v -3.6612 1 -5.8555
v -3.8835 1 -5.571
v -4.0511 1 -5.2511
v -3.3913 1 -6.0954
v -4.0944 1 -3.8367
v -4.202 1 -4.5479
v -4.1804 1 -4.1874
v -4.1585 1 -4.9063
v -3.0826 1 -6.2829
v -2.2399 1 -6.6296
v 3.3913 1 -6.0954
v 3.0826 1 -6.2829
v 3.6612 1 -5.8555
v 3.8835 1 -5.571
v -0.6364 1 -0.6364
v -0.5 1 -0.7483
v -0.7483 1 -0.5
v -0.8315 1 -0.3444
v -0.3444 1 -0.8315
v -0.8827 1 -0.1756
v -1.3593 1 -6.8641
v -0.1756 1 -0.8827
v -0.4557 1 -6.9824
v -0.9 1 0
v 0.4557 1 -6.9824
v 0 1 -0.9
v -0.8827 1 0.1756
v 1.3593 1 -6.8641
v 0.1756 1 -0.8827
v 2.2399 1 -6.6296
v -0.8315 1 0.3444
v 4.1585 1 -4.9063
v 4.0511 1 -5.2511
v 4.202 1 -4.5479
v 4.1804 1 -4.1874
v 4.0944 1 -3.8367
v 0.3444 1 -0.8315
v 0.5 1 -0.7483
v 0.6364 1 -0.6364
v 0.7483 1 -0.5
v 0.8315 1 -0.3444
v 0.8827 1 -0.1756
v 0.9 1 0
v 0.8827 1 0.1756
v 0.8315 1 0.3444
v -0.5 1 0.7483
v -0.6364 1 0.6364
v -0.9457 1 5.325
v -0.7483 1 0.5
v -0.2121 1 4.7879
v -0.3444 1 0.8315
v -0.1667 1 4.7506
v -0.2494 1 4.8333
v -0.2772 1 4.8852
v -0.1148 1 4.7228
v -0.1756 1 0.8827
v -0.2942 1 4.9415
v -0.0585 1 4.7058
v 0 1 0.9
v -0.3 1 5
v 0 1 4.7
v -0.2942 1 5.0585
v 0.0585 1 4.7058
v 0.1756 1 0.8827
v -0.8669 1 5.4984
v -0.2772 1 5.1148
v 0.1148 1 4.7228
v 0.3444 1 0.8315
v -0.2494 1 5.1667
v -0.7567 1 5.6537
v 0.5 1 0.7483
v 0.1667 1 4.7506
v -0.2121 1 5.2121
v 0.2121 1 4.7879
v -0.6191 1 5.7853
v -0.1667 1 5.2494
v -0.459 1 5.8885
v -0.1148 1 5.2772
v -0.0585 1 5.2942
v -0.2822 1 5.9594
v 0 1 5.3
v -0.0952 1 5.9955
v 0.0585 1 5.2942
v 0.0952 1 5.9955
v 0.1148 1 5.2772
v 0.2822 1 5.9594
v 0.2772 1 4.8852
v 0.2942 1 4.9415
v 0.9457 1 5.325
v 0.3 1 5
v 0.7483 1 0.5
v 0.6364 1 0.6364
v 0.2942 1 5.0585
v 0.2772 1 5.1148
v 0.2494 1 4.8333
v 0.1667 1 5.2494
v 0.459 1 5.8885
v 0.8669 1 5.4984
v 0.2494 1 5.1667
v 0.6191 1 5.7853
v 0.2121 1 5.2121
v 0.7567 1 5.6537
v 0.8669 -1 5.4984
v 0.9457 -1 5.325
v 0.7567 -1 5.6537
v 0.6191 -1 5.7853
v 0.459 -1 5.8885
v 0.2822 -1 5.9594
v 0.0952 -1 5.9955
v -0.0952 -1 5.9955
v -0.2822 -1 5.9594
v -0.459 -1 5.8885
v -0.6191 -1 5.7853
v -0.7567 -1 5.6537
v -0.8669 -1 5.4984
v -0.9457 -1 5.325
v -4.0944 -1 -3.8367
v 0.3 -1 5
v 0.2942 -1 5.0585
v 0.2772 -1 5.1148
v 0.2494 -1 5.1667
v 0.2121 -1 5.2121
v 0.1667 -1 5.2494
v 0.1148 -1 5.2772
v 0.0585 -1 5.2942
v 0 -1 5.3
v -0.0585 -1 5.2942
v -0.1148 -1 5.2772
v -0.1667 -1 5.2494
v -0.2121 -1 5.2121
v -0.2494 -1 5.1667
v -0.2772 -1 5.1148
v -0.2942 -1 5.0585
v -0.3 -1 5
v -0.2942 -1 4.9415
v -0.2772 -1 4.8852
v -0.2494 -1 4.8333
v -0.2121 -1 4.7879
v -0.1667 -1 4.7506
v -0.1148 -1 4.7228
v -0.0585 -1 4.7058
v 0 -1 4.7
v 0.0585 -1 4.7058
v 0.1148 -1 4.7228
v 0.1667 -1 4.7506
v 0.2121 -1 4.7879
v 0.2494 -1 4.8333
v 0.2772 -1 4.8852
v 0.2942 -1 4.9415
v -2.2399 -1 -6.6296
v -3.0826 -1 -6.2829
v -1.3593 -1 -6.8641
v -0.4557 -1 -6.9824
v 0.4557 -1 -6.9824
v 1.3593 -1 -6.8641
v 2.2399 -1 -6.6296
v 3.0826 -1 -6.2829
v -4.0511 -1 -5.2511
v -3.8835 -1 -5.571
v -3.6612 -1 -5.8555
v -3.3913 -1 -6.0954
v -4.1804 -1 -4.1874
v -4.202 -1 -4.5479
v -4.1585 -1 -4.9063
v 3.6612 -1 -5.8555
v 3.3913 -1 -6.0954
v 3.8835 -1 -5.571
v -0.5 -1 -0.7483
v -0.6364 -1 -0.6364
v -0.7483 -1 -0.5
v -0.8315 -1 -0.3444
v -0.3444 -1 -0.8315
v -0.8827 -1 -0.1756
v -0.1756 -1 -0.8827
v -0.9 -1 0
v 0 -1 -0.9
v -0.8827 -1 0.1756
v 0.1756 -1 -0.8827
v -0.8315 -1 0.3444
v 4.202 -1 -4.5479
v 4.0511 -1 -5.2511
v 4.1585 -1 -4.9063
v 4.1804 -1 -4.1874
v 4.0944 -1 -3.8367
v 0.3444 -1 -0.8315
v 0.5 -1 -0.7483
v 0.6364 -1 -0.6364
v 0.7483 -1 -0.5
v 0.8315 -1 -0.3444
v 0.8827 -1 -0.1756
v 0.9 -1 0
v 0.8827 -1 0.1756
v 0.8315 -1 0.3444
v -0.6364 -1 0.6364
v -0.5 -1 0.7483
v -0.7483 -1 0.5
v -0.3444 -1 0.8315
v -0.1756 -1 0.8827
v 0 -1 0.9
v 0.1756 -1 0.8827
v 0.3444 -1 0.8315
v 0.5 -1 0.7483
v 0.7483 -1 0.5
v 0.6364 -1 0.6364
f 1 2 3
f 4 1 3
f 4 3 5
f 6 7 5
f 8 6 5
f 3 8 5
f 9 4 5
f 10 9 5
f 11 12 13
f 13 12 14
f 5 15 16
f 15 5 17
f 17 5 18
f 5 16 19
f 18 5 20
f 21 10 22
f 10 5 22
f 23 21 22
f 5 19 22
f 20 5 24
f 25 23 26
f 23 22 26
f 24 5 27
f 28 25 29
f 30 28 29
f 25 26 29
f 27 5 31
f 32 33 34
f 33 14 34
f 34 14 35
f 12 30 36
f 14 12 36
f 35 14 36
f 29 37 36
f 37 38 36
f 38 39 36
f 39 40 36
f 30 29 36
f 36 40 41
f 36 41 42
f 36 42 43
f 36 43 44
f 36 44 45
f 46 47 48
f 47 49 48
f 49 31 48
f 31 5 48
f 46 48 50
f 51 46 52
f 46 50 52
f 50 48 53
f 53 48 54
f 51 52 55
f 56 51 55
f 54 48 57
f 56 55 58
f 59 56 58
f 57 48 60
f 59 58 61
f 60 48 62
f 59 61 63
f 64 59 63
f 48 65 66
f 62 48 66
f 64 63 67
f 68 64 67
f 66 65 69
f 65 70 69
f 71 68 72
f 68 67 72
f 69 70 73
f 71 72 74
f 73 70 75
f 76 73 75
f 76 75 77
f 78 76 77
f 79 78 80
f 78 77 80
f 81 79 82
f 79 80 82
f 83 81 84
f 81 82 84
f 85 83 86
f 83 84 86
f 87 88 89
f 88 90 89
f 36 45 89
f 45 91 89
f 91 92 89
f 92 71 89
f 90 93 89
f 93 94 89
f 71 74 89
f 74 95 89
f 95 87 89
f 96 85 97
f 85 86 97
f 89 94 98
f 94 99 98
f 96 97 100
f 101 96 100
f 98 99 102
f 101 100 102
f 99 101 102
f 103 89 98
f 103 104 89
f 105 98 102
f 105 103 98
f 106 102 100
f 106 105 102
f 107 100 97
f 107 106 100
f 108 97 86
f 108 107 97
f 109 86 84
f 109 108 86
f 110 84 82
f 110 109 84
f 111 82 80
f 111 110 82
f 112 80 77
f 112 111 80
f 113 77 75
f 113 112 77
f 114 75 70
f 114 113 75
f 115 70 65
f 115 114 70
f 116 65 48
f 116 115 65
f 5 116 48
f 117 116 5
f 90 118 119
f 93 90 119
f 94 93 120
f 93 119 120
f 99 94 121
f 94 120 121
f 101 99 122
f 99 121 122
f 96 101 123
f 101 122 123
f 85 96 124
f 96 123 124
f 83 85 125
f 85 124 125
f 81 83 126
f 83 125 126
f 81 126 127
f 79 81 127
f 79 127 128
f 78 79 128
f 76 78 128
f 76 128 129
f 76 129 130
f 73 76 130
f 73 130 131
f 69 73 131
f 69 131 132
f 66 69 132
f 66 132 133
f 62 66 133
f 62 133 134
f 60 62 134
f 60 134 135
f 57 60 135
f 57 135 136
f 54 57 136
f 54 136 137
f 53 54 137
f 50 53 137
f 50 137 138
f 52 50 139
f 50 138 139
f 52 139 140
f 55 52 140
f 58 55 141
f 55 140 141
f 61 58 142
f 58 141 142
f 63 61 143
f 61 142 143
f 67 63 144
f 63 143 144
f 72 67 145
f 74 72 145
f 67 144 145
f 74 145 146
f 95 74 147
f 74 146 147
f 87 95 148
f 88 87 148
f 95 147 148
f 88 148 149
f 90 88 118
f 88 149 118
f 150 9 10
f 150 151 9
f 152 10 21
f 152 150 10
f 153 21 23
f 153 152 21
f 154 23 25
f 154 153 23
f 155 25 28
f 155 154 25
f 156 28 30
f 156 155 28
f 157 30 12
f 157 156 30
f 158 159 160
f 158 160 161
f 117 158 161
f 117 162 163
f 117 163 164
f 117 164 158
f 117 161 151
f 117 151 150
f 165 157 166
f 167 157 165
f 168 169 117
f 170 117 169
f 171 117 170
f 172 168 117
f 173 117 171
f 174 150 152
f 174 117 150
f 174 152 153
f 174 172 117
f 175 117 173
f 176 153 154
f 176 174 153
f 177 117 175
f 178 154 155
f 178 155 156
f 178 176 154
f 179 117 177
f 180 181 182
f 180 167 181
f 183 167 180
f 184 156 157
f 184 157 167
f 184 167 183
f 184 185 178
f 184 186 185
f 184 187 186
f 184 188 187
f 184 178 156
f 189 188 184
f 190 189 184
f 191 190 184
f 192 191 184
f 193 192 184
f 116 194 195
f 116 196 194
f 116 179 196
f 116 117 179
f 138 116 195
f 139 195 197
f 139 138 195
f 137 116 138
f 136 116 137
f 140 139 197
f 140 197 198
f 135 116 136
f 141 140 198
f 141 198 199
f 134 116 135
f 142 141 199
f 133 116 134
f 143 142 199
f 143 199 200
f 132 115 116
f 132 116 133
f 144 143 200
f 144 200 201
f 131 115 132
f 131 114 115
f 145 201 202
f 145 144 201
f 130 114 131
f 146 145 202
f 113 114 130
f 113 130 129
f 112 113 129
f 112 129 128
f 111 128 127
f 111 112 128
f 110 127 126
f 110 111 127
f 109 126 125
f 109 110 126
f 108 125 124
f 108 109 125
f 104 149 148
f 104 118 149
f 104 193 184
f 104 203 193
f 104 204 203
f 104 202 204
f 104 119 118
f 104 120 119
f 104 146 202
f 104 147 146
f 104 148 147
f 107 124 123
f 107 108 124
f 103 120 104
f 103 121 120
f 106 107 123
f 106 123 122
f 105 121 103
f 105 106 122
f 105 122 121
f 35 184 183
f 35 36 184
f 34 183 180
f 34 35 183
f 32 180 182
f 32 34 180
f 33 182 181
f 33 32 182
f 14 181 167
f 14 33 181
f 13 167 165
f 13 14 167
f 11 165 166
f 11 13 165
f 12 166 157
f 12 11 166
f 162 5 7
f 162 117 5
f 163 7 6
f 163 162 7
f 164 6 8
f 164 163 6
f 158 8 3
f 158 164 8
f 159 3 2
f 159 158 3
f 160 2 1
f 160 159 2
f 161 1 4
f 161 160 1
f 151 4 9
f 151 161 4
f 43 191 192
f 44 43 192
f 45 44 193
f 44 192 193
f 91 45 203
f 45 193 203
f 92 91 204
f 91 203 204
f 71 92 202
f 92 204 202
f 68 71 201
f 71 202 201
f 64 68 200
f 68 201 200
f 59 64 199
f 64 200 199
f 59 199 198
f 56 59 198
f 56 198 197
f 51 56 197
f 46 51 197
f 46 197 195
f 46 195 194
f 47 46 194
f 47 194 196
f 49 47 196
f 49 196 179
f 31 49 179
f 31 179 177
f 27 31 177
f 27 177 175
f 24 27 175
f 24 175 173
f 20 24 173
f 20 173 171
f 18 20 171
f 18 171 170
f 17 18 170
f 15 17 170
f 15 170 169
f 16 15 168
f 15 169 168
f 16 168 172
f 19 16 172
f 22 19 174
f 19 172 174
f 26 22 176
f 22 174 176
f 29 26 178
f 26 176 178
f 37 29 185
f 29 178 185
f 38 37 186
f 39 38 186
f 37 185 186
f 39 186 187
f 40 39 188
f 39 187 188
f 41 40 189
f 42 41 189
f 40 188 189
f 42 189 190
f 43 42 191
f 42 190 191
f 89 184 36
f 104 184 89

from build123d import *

# Parameters (mm, degrees)
F1_DEPTH = 1
F2_R     = 0.9
F2_R_2   = 0.3
F3_DEPTH = 2.001
F4_R     = 2


# Not quite as in the source:
# - a feature names something its author has since deleted; it is built from what else it names


with BuildPart() as f1:
    # F0 (on Front) → F1 (new body, symmetric)
    with BuildSketch(Plane.XZ):
        with BuildLine():
            ThreePointArc((-0.9457076356, 5.3250185657), (-0.1647609851, 4.0136664774), (1, 5))
            ThreePointArc((1, 5), (0.9863335226, 5.1647609851), (0.9457076356, 5.3250185657))
            ThreePointArc((0.9457076356, 5.3250185657), (0, 6), (-0.9457076356, 5.3250185657))
        make_face()
        with BuildLine():
            ThreePointArc((0.9457076356, 5.3250185657), (0.9863335226, 5.1647609851), (1, 5))
            ThreePointArc((1, 5), (-0.1647609851, 4.0136664774), (-0.9457076356, 5.3250185657))
            Line((-0.9457076356, 5.3250185657), (-4.5916600475, -5.2836216754))
            ThreePointArc((-4.5916600475, -5.2836216754), (0, -6.9972097643), (4.5916600475, -5.2836216754))
            Line((4.5916600475, -5.2836216754), (0.9457076356, 5.3250185657))
        make_face()
    extrude(amount=F1_DEPTH, both=True)

    # F2 (on face) → F3 (cut, through all)
    with BuildSketch(Plane.XZ.offset(1)):
        Circle(F2_R)
        with Locations((0, 5)):
            Circle(F2_R_2)
    extrude(amount=-F3_DEPTH, mode=Mode.SUBTRACT)

    # F4
    f4_edges = [f1.edges().sort_by_distance(p)[0] for p in [
        (4.59166, 0, -5.283622),
        (-4.59166, 0, -5.283622),
    ]]
    fillet(f4_edges, radius=F4_R)


solid = f1.part
